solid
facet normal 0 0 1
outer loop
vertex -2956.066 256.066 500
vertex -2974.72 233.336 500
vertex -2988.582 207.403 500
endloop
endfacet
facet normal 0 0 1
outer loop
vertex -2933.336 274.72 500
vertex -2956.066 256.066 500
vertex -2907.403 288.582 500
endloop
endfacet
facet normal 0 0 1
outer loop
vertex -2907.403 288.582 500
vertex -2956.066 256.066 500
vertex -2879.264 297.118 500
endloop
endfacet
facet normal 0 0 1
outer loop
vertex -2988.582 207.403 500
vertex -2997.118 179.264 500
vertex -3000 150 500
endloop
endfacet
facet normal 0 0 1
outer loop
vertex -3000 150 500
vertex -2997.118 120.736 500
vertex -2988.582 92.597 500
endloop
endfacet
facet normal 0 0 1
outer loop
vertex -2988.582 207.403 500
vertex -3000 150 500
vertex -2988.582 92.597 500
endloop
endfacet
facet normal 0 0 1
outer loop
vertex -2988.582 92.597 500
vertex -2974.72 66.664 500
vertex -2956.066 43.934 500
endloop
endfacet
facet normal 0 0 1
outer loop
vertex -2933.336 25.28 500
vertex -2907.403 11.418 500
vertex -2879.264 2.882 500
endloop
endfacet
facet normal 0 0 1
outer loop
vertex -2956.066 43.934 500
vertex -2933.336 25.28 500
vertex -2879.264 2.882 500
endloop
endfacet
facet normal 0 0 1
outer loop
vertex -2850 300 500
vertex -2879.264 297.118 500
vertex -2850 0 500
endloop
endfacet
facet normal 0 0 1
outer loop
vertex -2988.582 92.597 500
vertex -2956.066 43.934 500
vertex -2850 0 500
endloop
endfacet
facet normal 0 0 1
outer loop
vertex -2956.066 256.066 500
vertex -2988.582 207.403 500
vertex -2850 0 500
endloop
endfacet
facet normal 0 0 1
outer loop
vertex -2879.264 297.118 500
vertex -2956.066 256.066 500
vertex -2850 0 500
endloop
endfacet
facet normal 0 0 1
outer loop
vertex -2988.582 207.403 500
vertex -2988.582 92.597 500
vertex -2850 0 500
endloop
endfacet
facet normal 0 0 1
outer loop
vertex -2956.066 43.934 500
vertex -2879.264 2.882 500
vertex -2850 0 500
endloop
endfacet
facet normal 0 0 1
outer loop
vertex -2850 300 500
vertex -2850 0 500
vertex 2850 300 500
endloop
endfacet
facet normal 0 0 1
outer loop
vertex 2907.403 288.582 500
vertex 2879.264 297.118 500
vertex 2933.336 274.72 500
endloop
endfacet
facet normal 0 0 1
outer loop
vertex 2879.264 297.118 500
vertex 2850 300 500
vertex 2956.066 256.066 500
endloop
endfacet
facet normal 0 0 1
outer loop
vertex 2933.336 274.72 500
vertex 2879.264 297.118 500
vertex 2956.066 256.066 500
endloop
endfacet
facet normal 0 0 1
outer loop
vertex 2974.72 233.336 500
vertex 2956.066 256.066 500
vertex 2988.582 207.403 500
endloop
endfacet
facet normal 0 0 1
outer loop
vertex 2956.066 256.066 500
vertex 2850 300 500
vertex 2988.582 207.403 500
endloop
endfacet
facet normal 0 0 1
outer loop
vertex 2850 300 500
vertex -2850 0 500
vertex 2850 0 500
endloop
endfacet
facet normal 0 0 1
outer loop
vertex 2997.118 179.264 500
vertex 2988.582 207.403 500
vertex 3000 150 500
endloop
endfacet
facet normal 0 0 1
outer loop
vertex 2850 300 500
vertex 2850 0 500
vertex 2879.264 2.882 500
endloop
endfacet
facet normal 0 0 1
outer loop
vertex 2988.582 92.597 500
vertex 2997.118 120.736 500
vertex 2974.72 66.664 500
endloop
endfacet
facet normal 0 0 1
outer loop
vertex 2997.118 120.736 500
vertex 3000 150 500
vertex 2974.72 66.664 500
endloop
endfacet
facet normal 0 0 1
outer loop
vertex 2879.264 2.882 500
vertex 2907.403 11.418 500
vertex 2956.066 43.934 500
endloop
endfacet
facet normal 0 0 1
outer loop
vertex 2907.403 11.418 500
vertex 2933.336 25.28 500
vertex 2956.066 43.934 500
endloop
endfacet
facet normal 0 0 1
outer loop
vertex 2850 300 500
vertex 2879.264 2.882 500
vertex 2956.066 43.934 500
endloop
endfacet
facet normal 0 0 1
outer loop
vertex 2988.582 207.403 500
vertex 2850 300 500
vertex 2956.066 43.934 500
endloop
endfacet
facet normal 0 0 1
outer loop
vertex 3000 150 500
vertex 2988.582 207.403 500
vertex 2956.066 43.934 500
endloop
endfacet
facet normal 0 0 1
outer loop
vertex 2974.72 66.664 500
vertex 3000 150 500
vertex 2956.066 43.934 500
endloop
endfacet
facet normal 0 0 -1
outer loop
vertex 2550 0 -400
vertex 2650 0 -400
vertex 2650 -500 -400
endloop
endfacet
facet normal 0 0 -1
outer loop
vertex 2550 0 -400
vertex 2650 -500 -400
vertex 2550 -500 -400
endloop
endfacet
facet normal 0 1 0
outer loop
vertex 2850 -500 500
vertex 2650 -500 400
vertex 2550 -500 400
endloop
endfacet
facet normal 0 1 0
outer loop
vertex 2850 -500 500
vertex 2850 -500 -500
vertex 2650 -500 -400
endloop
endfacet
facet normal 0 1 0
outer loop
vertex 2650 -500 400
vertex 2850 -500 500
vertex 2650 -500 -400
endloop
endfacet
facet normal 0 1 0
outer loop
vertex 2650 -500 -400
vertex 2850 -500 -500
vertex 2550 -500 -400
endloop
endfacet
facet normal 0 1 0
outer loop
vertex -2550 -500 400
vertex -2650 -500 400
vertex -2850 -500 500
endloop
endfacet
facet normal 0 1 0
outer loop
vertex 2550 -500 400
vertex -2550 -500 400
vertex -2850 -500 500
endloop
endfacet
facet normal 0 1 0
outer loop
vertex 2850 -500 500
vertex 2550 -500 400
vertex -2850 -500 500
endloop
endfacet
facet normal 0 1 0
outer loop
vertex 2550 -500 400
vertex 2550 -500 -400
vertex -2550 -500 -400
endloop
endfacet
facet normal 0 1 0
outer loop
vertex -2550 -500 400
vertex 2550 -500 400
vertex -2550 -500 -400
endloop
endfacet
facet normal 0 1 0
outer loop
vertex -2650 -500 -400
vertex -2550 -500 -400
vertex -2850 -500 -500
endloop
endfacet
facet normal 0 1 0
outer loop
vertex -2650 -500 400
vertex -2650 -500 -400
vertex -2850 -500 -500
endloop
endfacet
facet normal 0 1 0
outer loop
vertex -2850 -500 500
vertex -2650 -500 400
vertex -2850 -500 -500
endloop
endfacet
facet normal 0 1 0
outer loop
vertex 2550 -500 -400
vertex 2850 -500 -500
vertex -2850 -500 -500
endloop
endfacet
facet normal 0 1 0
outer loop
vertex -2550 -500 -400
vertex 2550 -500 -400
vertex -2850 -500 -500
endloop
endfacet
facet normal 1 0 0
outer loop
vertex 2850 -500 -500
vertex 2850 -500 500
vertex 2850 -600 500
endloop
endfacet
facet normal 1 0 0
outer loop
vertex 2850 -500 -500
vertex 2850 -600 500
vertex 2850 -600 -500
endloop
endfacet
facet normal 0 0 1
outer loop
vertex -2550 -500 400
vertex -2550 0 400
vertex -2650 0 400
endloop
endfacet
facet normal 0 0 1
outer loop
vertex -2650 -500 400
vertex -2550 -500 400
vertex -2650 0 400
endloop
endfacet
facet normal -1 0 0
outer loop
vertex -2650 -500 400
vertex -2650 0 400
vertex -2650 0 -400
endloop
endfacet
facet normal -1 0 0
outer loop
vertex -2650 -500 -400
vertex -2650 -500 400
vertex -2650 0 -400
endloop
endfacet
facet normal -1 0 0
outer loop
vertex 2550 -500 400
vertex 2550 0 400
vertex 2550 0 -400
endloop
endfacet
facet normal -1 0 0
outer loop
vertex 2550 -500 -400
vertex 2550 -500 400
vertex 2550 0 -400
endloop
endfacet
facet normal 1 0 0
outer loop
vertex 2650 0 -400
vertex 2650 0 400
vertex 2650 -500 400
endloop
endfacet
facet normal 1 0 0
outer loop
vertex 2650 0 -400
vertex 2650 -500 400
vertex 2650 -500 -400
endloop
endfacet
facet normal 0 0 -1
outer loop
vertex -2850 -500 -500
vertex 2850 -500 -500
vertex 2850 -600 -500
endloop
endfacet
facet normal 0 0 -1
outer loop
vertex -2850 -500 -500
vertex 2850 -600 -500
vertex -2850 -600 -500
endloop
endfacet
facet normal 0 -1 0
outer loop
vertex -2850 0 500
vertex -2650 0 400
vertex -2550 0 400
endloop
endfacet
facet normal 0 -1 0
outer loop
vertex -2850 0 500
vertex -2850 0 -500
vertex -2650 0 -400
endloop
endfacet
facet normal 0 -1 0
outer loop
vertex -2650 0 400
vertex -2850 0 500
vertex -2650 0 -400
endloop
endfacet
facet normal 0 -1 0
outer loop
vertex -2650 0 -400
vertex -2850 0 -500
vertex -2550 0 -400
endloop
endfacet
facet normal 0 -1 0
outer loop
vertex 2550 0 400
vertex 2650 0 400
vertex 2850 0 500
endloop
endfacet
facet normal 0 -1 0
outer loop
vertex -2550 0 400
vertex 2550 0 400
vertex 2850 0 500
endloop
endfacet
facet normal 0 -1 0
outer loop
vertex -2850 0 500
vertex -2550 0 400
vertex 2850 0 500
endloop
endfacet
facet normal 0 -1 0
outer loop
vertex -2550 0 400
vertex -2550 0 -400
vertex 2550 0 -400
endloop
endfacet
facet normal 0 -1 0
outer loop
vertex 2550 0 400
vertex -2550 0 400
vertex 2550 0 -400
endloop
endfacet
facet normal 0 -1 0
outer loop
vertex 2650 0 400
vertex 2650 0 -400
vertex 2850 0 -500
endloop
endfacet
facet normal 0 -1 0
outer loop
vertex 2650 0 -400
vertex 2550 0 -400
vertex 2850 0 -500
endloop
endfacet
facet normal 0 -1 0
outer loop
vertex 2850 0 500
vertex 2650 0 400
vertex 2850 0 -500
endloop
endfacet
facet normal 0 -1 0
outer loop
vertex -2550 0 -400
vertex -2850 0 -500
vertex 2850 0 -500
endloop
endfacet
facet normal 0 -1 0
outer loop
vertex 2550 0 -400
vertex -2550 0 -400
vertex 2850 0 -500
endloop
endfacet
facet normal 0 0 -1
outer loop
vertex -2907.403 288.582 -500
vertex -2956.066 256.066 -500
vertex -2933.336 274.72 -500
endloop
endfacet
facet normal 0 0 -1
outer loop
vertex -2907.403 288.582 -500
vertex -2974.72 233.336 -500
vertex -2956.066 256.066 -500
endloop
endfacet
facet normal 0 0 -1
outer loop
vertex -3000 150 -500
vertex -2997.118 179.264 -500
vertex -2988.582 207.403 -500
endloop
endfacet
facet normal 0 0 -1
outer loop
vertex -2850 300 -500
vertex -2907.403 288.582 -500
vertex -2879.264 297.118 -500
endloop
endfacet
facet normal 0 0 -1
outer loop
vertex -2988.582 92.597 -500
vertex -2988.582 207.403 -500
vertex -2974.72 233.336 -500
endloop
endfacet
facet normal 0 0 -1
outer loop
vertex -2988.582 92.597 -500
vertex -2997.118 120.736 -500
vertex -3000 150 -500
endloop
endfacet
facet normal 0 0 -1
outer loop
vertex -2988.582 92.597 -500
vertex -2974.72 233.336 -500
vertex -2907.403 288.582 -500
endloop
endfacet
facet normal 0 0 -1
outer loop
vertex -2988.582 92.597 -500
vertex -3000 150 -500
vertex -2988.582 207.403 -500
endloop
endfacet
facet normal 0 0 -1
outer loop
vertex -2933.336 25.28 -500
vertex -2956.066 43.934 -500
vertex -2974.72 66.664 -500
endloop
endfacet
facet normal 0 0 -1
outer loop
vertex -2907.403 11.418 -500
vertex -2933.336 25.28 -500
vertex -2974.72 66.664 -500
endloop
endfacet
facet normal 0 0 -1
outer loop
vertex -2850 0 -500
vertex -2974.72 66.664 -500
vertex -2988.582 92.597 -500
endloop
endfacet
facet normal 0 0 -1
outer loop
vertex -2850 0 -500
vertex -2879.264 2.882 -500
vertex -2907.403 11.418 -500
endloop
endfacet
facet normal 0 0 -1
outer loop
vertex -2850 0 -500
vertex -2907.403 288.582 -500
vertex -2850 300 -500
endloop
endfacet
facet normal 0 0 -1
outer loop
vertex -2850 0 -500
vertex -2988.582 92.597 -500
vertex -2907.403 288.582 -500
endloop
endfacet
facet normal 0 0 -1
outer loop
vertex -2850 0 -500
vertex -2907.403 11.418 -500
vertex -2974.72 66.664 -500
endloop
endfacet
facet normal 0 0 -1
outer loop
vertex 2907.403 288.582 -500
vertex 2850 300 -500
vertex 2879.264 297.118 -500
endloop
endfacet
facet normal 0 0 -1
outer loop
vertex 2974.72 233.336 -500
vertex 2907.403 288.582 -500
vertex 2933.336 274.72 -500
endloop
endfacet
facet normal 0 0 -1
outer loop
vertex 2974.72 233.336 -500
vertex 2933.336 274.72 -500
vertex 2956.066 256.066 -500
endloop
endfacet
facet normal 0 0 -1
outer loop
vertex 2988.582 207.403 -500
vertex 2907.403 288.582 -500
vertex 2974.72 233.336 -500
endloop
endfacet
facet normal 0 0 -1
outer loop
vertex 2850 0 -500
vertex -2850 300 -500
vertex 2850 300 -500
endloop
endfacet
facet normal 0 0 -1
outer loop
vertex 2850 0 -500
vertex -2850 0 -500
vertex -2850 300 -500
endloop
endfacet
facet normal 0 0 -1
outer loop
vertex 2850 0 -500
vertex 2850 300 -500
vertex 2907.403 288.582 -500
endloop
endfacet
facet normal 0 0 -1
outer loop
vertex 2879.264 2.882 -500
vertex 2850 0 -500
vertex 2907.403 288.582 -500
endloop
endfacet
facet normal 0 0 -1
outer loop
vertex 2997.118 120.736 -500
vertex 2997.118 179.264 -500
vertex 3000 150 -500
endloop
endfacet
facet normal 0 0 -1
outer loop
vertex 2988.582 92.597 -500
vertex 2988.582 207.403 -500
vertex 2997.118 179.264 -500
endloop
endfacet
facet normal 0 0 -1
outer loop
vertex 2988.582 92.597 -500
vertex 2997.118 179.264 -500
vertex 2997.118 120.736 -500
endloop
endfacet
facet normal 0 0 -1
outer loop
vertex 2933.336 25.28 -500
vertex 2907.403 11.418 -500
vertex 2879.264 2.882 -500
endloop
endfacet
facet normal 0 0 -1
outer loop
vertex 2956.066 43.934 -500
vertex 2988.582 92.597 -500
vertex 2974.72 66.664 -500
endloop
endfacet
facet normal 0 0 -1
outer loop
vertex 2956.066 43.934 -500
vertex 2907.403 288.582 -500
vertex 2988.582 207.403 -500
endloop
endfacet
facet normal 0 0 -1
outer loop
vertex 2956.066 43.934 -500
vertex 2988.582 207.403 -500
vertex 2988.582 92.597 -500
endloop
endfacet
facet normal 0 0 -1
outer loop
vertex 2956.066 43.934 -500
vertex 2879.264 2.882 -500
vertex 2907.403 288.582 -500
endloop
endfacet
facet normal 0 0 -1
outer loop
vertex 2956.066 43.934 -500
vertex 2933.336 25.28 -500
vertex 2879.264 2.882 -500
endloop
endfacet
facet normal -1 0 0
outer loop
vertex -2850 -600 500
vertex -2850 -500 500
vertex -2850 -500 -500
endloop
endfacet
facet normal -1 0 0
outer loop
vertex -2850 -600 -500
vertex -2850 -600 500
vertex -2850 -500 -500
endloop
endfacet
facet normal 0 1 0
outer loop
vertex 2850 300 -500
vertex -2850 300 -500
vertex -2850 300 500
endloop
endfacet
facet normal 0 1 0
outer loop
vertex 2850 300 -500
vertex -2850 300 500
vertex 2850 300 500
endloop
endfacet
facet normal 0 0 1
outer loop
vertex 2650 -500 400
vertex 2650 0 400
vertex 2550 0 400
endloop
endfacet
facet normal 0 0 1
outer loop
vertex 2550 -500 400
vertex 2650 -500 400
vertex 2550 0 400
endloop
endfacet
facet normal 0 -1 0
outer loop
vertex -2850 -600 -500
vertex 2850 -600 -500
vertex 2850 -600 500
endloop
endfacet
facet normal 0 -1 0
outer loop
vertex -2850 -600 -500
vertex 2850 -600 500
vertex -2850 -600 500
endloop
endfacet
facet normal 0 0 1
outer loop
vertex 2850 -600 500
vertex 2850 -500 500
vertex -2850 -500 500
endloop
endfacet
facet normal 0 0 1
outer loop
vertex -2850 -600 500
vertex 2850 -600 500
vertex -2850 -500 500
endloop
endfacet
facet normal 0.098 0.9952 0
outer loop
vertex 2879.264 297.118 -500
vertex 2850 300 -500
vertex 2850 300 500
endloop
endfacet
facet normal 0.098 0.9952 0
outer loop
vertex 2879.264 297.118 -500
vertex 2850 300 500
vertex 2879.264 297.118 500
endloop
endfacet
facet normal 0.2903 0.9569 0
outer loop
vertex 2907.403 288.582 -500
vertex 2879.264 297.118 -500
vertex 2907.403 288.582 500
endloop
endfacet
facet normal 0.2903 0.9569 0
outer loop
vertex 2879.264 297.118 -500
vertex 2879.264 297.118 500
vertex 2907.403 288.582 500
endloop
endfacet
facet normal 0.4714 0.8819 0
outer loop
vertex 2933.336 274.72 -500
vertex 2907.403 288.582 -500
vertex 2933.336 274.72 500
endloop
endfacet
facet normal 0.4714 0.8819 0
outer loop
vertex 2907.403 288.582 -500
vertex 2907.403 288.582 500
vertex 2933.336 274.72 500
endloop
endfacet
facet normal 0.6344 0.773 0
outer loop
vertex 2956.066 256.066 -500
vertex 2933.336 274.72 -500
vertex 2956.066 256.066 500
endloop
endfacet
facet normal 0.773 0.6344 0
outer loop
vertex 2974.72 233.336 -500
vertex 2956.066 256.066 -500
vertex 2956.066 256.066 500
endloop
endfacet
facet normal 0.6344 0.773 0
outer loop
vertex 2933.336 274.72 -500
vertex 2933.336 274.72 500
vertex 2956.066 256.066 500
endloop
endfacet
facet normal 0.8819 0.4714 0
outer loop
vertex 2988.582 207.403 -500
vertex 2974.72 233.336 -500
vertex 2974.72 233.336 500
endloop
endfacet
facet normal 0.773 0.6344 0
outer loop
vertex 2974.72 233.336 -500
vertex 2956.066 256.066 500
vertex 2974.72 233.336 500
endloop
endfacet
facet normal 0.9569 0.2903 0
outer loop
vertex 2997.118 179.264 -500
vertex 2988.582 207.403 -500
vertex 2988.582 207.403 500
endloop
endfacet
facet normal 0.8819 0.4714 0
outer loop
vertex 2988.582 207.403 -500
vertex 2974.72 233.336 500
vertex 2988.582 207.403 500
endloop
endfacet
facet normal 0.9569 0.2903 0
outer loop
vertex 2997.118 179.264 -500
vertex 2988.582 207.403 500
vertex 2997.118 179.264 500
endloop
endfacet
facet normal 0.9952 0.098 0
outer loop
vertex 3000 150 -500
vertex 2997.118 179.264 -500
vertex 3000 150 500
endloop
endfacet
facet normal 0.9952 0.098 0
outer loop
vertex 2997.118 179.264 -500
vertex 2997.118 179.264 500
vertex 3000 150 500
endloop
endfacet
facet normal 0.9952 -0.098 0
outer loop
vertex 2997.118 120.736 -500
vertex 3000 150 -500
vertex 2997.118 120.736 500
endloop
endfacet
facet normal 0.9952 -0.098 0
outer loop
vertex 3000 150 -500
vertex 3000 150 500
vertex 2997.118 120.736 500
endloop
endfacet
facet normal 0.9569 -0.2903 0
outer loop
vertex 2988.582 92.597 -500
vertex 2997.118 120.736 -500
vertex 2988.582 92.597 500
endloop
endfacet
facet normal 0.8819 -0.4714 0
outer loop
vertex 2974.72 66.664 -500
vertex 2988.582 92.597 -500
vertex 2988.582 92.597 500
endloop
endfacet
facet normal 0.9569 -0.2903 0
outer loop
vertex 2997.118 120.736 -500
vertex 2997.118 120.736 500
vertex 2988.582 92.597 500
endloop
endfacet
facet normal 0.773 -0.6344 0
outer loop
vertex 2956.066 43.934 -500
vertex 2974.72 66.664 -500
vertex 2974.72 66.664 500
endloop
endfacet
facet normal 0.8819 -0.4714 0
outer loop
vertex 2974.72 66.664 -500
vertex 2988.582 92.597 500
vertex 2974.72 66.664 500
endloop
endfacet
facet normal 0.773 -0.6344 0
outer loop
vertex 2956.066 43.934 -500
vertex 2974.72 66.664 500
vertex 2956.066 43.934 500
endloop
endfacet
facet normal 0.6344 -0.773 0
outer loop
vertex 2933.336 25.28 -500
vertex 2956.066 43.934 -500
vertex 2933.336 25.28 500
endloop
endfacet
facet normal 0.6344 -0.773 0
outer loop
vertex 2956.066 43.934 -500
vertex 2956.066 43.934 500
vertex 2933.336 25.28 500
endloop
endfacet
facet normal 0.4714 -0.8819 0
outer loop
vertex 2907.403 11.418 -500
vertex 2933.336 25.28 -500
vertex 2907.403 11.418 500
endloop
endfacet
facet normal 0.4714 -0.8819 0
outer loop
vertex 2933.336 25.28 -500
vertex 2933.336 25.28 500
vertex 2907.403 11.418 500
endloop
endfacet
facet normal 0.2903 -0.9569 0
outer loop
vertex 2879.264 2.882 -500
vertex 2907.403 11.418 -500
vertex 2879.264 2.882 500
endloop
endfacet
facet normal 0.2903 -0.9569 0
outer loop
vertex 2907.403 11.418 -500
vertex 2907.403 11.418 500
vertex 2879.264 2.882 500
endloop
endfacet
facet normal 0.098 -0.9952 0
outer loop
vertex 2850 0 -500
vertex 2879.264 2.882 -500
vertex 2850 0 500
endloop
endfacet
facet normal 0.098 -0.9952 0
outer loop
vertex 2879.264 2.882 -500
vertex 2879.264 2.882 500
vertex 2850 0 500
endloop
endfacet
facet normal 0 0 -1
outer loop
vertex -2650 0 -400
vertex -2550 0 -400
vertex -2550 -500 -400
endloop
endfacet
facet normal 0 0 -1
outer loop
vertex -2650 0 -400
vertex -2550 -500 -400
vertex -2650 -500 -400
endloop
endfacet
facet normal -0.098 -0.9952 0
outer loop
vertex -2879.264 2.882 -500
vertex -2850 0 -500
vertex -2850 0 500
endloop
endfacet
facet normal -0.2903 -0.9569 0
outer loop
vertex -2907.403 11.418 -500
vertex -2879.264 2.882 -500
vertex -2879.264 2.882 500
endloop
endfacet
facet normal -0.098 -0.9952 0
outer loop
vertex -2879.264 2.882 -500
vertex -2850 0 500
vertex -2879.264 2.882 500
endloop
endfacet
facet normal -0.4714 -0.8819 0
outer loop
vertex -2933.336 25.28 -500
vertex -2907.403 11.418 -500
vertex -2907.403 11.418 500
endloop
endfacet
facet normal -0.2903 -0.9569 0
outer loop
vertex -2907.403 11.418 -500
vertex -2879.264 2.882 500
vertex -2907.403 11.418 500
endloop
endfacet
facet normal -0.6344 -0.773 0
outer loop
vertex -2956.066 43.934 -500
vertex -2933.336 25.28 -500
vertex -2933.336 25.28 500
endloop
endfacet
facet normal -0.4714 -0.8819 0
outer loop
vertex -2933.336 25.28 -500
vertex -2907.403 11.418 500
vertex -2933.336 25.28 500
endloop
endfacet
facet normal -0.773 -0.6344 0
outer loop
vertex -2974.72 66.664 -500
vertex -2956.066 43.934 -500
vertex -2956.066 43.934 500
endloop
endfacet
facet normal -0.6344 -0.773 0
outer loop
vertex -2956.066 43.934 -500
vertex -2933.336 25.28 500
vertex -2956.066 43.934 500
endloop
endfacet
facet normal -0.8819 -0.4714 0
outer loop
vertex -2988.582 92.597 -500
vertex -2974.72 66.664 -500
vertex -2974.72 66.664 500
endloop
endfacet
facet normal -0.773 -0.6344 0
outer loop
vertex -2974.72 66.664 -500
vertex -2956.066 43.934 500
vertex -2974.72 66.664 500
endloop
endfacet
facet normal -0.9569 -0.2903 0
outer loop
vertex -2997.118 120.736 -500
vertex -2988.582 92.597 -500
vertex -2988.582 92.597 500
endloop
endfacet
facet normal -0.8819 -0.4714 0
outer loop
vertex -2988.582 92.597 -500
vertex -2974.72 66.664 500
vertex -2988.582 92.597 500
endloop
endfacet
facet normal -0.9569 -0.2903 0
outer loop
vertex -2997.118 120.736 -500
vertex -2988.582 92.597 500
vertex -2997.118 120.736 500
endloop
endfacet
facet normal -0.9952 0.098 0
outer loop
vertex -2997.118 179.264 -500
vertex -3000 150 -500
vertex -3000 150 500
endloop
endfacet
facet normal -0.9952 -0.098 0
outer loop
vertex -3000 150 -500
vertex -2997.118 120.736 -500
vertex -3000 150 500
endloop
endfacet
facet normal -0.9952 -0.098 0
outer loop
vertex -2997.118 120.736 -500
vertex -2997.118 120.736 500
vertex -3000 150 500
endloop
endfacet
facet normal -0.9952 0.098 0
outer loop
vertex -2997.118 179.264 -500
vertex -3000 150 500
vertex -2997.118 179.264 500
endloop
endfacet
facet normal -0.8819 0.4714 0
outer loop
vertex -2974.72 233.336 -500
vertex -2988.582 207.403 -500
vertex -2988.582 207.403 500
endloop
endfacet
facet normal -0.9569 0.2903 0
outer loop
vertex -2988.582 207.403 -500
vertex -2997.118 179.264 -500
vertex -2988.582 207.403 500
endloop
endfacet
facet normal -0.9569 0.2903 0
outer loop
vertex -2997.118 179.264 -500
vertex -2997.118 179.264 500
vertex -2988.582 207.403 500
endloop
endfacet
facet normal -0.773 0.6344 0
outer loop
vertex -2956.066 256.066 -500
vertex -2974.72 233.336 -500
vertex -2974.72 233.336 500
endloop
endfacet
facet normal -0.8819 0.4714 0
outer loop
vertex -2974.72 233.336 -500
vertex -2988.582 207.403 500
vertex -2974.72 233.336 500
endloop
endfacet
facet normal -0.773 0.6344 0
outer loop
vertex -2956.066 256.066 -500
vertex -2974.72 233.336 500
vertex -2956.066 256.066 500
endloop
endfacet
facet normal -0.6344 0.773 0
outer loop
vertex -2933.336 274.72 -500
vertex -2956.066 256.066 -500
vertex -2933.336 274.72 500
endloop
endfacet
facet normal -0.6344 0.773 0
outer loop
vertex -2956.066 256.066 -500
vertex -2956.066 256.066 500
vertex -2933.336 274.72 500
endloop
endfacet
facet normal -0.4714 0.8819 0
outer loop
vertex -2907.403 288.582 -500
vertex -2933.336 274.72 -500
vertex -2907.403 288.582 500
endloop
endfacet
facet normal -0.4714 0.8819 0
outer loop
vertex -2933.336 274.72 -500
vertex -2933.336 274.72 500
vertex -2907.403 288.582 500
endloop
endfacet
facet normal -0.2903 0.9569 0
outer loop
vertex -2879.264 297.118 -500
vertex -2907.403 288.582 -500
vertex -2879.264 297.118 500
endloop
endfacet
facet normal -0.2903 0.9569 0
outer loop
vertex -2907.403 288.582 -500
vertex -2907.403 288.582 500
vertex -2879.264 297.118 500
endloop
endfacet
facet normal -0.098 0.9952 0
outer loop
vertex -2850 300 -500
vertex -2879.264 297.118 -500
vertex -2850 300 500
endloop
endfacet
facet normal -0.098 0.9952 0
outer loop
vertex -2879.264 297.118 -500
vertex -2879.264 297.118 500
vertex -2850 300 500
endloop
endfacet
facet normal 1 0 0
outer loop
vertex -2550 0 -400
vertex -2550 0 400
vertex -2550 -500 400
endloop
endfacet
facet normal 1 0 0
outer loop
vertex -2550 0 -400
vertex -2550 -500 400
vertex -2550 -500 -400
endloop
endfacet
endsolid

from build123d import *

# Parameters (mm, degrees)
SKETCH1_W           = 6000
SKETCH1_H           = 1000
BOSS_EXTRUDE1_DEPTH = 300
CUT_EXTRUDE1_DEPTH  = 1001
SKETCH5_W           = 100
SKETCH5_H           = 800
BOSS_EXTRUDE2_DEPTH = 500
SKETCH6_W           = 5700
SKETCH6_H           = 1000
BOSS_EXTRUDE3_DEPTH = 100


with BuildPart() as part:
    # Sketch1 → Boss-Extrude1 (new body)
    with BuildSketch(Plane(origin=(0, 0, 0), x_dir=(1, 0, 0), z_dir=(0, 1, 0))):
        Rectangle(SKETCH1_W, SKETCH1_H)
    extrude(amount=BOSS_EXTRUDE1_DEPTH)

    # Sketch4 → Cut-Extrude1 (cut, through all)
    with BuildSketch(Plane.XY.offset(500)):
        with BuildLine():
            Line((3000, 300), (2850, 300))
            ThreePointArc((2850, 300), (2956.066017178, 256.066017178), (3000, 150))
            Line((3000, 150), (3000, 300))
        make_face()
        with BuildLine():
            Line((3000, 0), (3000, 150))
            ThreePointArc((3000, 150), (2956.066017178, 43.933982822), (2850, 0))
            Line((2850, 0), (3000, 0))
        make_face()
        with BuildLine():
            Line((-2850, 300), (-3000, 300))
            Line((-3000, 300), (-3000, 150))
            ThreePointArc((-3000, 150), (-2956.066017178, 256.066017178), (-2850, 300))
        make_face()
        with BuildLine():
            ThreePointArc((-2850, 0), (-2956.066017178, 43.933982822), (-3000, 150))
            Line((-3000, 150), (-3000, 0))
            Line((-3000, 0), (-2850, 0))
        make_face()
    extrude(amount=-CUT_EXTRUDE1_DEPTH, mode=Mode.SUBTRACT)

    # Sketch5 → Boss-Extrude2 (add)
    with BuildSketch(Plane(origin=(0, 0, 0), x_dir=(-1, 0, 0), z_dir=(0, -1, 0))):
        with Locations((2600, 0)):
            Rectangle(SKETCH5_W, SKETCH5_H)
        with Locations((-2600, 0)):
            Rectangle(SKETCH5_W, SKETCH5_H)
    extrude(amount=BOSS_EXTRUDE2_DEPTH)

    # Sketch6 → Boss-Extrude3 (add)
    with BuildSketch(Plane(origin=(0, -500, 0), x_dir=(-1, 0, 0), z_dir=(0, -1, 0))):
        Rectangle(SKETCH6_W, SKETCH6_H)
    extrude(amount=BOSS_EXTRUDE3_DEPTH)


solid = part.part
